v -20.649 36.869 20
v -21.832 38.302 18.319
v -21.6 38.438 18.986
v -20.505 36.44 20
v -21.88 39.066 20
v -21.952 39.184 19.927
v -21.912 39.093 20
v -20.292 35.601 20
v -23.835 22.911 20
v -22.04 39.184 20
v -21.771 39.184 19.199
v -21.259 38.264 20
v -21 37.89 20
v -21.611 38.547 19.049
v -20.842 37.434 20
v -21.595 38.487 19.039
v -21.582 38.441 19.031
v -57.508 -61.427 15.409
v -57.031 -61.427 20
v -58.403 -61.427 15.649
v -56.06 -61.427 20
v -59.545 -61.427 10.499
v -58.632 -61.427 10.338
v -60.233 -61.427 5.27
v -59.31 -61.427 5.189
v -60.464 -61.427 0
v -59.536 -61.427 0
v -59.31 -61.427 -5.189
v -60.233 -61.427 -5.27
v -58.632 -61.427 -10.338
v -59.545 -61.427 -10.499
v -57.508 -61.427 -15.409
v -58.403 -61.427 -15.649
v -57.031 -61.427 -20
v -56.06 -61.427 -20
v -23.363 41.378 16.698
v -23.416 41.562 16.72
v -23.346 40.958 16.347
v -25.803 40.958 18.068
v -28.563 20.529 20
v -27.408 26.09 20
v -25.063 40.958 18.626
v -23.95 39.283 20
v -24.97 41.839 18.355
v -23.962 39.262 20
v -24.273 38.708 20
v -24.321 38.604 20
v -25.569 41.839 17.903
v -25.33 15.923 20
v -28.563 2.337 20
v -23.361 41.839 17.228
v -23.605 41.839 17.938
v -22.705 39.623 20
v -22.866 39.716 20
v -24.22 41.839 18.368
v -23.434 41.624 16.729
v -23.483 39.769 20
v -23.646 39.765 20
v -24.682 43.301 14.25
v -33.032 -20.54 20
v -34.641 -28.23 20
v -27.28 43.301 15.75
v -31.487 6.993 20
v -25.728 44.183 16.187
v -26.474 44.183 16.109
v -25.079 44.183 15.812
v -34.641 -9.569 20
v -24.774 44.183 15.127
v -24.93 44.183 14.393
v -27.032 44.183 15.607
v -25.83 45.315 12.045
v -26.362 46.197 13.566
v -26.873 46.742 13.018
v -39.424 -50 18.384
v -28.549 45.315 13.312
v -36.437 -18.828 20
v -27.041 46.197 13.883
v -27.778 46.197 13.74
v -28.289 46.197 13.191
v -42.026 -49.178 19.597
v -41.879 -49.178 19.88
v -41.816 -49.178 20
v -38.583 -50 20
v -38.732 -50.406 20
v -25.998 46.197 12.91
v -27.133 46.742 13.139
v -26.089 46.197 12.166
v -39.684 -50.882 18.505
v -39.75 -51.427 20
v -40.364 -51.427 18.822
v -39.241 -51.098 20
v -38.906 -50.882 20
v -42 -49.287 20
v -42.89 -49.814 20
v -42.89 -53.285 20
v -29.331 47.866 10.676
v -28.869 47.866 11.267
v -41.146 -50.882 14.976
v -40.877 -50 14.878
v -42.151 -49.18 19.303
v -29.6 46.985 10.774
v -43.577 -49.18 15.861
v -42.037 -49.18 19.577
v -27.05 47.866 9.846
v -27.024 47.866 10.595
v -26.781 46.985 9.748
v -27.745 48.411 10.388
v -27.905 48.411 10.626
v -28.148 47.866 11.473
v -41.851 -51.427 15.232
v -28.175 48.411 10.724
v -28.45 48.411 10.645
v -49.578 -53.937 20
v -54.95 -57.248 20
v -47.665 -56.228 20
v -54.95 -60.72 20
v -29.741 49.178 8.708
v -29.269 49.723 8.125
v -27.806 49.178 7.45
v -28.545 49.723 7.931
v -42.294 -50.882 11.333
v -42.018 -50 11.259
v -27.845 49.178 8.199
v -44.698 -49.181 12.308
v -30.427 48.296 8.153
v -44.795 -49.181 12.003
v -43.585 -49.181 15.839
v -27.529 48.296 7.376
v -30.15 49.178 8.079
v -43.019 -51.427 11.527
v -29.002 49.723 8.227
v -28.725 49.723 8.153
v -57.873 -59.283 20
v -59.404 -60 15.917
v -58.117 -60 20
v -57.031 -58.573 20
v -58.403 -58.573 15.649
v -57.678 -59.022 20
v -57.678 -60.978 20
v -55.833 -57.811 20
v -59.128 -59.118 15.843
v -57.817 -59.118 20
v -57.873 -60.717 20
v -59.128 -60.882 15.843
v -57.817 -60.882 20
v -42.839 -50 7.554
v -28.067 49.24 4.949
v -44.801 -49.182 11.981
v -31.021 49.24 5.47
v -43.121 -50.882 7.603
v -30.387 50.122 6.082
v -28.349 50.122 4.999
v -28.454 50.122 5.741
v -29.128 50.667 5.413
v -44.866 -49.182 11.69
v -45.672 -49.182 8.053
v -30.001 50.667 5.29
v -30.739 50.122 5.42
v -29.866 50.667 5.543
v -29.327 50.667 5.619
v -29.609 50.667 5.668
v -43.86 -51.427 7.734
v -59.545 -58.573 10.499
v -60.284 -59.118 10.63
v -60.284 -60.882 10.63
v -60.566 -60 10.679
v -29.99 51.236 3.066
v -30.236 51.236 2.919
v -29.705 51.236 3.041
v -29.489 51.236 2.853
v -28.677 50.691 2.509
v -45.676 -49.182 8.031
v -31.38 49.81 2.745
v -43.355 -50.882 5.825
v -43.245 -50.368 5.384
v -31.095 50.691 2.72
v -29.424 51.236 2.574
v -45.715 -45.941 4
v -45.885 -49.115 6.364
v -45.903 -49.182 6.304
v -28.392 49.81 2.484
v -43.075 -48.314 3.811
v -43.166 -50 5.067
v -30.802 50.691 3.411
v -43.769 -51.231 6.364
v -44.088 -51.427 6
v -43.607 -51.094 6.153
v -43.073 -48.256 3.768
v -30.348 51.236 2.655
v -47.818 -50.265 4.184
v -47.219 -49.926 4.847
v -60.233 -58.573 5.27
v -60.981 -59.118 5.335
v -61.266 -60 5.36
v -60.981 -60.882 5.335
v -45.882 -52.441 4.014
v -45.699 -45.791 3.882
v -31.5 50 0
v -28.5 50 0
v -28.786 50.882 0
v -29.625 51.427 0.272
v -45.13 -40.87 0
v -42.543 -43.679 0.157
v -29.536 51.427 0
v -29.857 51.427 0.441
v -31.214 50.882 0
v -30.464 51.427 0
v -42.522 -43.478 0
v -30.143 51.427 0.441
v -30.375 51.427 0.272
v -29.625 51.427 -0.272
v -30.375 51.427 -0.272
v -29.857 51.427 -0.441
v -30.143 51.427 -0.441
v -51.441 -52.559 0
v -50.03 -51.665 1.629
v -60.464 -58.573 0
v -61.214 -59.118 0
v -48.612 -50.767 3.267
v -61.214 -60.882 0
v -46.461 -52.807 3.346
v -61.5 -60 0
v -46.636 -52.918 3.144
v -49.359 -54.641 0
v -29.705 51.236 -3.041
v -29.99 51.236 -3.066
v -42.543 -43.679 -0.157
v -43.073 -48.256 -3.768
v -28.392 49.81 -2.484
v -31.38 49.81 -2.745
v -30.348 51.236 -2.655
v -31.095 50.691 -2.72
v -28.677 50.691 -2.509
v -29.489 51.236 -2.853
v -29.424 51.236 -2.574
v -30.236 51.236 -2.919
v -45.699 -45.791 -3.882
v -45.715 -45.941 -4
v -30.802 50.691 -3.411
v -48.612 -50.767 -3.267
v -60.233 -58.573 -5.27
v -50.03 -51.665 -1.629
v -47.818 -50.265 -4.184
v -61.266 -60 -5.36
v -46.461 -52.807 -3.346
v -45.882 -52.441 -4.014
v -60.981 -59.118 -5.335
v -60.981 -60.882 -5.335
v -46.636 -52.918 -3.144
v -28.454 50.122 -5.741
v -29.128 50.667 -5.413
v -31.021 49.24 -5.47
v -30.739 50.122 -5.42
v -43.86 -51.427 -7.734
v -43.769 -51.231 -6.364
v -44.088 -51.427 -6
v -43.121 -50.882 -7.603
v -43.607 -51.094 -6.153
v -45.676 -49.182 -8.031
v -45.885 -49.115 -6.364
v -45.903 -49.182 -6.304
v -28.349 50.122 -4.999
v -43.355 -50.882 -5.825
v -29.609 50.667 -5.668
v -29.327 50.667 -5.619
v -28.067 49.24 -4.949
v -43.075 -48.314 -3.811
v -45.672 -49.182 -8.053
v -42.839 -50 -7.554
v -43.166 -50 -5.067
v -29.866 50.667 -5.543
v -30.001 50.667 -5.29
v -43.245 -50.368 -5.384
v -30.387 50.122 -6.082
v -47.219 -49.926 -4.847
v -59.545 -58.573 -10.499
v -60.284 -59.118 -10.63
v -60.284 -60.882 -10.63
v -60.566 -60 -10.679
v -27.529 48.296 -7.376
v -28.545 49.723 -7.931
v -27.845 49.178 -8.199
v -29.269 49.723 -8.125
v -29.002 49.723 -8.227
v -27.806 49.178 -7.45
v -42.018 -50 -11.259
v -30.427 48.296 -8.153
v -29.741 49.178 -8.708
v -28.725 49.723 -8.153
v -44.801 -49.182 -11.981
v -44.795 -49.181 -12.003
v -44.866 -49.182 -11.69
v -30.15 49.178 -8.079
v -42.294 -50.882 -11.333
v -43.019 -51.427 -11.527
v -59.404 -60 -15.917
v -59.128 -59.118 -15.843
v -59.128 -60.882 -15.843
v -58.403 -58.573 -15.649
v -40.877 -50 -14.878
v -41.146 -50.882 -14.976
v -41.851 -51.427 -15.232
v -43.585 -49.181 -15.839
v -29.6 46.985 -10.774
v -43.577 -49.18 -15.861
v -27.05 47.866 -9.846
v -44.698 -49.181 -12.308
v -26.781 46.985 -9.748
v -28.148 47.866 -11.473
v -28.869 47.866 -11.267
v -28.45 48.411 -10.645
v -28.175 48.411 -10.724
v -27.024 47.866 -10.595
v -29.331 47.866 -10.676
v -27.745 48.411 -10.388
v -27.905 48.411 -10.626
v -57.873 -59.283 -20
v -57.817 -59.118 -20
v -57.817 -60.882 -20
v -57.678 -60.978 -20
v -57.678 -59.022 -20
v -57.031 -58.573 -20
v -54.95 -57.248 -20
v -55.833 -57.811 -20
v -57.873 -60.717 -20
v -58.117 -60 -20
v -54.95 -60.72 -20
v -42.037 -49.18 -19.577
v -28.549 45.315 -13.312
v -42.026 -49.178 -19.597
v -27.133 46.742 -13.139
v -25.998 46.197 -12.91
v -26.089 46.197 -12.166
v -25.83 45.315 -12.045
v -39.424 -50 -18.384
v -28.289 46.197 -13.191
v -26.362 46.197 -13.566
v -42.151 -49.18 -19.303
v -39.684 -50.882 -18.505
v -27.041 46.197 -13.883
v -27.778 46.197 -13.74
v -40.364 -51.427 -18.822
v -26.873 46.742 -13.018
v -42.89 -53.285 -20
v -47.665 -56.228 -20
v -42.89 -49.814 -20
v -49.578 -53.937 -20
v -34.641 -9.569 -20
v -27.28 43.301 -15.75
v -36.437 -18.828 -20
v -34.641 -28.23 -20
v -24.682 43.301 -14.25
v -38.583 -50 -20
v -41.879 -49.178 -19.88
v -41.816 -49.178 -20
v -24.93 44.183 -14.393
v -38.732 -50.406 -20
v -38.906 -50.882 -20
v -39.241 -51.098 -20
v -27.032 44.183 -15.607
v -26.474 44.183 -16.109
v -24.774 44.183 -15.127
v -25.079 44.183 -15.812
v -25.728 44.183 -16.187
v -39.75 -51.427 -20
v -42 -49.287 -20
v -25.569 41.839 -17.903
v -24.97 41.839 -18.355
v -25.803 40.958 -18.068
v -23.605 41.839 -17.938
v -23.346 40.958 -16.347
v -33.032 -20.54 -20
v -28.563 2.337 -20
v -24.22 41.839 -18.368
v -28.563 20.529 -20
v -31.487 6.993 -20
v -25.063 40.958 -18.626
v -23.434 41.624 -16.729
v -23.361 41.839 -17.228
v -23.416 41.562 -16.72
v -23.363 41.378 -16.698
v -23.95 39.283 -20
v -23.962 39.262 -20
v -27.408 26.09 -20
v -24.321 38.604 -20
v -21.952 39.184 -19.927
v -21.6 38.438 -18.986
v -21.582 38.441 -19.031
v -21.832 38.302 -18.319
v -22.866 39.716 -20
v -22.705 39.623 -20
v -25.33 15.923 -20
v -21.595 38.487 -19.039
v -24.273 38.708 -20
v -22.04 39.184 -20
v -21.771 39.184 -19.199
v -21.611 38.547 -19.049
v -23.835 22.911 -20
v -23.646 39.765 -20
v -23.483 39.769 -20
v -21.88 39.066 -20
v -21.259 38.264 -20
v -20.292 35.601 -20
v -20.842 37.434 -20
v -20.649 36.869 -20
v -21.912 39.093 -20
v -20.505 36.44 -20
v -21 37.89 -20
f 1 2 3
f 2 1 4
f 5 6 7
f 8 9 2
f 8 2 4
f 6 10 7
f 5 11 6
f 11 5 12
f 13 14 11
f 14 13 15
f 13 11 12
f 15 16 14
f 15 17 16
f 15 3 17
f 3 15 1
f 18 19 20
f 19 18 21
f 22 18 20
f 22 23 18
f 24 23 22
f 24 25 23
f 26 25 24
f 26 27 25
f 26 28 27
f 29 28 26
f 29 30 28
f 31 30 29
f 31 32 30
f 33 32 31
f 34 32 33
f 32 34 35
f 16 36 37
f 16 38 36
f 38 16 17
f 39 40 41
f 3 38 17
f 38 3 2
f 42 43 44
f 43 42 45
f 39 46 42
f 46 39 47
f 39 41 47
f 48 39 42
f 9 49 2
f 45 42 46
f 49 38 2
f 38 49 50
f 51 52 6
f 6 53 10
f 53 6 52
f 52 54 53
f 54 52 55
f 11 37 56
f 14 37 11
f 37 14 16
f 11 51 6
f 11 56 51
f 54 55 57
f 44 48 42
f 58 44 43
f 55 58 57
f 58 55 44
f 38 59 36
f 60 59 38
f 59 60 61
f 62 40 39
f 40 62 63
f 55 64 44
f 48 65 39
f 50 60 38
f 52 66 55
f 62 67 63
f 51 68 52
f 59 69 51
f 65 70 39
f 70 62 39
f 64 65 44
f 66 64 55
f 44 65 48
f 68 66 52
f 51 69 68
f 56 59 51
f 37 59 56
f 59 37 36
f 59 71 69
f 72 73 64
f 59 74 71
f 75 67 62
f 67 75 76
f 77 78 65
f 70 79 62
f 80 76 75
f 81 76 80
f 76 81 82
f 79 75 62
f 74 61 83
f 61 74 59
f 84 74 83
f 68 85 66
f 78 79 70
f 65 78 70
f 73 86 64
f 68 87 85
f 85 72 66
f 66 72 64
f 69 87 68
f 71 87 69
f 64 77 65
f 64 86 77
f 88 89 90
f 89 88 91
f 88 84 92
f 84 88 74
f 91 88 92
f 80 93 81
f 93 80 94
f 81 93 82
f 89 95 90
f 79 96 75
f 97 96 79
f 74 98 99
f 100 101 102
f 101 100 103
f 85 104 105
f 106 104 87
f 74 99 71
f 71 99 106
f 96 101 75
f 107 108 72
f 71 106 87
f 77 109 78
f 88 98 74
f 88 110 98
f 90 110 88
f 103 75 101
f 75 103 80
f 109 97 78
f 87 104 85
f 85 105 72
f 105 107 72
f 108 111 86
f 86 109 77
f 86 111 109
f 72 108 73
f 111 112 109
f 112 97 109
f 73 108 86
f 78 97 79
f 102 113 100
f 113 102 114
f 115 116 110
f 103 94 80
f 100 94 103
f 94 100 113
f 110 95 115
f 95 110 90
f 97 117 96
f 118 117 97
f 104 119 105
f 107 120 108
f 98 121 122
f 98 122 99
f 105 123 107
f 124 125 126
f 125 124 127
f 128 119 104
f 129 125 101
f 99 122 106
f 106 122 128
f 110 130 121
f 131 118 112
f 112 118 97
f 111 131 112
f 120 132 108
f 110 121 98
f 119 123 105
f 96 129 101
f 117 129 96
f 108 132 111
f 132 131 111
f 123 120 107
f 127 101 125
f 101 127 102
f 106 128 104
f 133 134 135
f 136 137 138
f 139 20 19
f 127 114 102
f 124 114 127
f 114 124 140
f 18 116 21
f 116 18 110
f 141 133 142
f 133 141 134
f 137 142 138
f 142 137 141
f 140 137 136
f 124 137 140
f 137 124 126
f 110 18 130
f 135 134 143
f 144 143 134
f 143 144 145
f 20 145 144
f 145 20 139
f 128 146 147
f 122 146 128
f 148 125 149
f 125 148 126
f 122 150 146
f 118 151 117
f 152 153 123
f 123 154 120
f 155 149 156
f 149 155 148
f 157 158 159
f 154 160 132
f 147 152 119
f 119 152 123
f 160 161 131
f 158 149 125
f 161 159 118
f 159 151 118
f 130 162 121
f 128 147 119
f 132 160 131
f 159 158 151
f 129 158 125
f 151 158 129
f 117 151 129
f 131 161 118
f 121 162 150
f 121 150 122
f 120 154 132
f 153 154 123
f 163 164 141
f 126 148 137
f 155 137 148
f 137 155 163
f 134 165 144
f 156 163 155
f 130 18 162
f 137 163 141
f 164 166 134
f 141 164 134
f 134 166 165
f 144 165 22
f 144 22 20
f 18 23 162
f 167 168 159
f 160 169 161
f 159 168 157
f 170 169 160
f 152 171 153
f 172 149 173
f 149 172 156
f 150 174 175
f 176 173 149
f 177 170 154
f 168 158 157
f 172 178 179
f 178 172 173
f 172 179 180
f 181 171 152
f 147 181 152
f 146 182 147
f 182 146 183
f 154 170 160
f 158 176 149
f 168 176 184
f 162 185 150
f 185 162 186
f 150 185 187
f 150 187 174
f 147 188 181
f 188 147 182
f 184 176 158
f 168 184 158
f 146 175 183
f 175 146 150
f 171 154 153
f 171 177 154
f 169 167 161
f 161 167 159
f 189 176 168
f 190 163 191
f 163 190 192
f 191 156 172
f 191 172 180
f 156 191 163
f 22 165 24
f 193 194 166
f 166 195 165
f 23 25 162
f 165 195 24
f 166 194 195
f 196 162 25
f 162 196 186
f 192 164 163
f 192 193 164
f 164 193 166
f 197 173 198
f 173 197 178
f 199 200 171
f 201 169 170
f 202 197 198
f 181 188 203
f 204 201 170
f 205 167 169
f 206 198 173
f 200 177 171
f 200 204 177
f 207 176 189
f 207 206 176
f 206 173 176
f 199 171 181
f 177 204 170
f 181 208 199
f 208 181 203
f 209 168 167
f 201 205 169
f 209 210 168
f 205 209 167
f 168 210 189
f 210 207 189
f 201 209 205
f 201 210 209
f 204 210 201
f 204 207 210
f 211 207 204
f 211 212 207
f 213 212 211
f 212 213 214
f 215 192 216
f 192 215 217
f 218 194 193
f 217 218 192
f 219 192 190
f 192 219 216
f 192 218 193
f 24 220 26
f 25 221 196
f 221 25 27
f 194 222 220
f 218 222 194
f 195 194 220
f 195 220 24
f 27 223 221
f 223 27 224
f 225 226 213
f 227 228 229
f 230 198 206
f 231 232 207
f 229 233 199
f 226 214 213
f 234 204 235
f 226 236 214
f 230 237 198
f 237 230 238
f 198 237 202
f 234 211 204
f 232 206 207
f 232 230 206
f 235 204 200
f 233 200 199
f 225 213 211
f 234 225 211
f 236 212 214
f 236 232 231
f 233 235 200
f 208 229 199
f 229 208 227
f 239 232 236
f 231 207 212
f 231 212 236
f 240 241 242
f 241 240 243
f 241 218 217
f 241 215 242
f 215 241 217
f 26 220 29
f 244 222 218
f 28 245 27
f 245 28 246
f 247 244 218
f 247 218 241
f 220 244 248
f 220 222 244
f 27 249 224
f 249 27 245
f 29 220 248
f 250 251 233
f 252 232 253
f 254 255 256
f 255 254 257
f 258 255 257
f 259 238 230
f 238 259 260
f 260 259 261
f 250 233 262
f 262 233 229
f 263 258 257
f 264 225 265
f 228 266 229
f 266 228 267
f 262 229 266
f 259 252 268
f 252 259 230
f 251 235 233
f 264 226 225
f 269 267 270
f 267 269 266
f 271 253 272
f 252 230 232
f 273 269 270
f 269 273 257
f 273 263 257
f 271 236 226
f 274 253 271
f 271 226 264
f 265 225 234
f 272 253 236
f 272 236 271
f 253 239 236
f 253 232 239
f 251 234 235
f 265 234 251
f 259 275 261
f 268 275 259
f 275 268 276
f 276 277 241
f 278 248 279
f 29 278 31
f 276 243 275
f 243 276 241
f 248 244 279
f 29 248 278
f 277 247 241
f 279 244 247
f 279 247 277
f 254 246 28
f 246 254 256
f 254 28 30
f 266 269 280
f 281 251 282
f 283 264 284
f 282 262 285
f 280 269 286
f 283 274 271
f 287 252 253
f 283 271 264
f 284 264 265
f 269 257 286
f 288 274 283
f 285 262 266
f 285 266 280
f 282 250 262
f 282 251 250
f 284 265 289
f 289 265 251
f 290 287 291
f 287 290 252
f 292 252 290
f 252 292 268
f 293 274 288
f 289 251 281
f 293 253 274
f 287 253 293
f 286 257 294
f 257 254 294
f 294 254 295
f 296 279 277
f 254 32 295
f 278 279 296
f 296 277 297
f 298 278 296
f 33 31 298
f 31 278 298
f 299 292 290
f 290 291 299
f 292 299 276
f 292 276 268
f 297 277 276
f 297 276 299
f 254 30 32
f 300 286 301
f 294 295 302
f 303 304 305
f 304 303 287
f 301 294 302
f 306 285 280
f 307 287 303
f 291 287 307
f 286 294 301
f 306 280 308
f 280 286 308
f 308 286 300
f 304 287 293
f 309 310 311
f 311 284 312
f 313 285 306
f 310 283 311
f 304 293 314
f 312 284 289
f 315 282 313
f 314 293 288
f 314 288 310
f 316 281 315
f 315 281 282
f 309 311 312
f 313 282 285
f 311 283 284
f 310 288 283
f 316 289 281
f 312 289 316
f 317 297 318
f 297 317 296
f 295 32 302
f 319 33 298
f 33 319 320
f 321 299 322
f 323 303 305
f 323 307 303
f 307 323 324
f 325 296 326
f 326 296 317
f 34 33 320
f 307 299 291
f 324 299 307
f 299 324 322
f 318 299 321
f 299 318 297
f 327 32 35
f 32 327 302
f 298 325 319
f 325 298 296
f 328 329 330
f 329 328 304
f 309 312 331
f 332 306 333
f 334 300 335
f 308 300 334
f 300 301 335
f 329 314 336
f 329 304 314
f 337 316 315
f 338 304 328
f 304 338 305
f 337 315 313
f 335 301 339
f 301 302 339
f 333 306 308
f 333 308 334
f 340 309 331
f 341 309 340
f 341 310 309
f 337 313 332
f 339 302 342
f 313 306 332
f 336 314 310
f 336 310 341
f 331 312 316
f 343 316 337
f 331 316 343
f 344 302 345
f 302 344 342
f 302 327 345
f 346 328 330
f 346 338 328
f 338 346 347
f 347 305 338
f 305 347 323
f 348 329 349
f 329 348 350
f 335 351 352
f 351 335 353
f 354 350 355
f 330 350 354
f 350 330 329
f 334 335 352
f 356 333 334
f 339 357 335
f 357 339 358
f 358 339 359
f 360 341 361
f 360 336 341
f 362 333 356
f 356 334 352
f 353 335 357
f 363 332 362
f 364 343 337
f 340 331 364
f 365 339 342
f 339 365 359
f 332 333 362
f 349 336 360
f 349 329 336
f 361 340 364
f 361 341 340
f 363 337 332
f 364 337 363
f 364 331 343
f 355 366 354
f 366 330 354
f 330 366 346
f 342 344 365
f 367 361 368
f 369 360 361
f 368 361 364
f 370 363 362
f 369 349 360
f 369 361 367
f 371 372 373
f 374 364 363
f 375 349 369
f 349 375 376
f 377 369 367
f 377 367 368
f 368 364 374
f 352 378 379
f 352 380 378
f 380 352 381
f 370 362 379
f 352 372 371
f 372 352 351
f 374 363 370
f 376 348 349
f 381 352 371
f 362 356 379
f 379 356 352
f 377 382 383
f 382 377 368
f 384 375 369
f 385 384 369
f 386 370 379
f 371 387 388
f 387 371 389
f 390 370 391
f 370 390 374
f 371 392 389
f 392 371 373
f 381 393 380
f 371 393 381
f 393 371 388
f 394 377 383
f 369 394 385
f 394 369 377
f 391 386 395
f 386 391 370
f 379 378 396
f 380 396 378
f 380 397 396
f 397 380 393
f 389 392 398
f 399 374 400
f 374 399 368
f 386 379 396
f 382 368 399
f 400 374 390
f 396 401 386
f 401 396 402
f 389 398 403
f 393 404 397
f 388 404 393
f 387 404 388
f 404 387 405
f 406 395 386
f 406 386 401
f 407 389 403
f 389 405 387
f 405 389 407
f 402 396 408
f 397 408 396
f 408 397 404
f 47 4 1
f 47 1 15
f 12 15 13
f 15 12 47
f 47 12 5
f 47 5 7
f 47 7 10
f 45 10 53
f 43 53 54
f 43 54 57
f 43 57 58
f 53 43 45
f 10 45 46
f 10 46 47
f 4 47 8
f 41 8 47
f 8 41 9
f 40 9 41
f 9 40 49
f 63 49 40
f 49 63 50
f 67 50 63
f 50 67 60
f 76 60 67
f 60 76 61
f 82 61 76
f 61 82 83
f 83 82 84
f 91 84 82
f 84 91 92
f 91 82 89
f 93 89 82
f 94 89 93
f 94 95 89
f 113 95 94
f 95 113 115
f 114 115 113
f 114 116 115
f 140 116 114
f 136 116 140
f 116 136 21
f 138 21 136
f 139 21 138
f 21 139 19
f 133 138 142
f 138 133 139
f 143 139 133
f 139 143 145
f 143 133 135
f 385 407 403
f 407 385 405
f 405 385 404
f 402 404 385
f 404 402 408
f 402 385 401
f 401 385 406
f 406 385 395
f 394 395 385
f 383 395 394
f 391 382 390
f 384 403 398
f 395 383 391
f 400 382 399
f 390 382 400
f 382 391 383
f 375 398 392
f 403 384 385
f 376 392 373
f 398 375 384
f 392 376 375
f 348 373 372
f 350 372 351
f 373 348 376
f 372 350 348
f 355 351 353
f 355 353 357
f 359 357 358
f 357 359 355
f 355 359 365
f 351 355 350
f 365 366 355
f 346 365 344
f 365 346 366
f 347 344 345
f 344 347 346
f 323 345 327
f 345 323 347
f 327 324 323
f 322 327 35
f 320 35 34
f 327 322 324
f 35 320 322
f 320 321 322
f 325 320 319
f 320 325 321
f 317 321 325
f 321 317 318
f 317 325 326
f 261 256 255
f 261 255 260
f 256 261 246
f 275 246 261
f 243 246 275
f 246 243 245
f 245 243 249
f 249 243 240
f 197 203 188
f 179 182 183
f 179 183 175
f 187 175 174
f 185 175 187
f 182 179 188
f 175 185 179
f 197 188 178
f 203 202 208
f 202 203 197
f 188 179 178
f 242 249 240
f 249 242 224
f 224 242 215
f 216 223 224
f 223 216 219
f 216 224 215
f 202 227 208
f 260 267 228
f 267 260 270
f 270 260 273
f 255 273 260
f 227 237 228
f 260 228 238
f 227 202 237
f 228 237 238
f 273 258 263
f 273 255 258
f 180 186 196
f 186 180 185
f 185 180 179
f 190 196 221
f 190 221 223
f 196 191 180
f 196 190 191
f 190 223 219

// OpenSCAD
//Length of the shoe horns straight part in mm
height=100; 

//Thickness of the shoe horn in mm
thick=3;

//Diameter of the hole to hang it
holesize=9;

//Radius of the circle for the main curvature at the end of the shoe horn
rad=30;

//Radius multiplier for the middle part of the shoe horn (make it flatter in the middle)
rad_multiplier1=1.5;

//Radius multiplier for the top end (make it even flatter and move it further out)
rad_multiplier2=2;

//How many degree from one face of the curvature to the next (bigger for faster rendering)
angle_step=5;

//Faces for the rounding at the ends of the shoe horn
faces=10;

// preview[view:left, tilt:side]

/* [Hidden] */

/*
Shoe Horn
Version C, November 2014
Written by MC Geisler (mcgenki at gmail dot com)

This is the baby sized version... Customize it to suit a yeti.

Have fun!

License: Attribution-NonCommercial-ShareAlike 4.0 International (CC BY-NC-SA 4.0)
You are free to:
    Share - copy and redistribute the material in any medium or format
    Adapt - remix, transform, and build upon the material
Under the following terms:
    Attribution - You must give appropriate credit, provide a link to the license, and indicate if changes were made. 
    You may do so in any reasonable manner, but not in any way that suggests the licensor endorses you or your use.
    NonCommercial - You may not use the material for commercial purposes.
    ShareAlike - If you remix, transform, or build upon the material, you must distribute your contributions under the same license as the original. 
*/

width=rad*1.4;

module stickballs(rot,low_z,high_z,low_r,high_r,round_low)
{
	rotate([0,0,rot])
		{
			translate([-low_r,0,low_z+(1-cos(rot))*round_low])
				sphere(r=thick/2,center=true,$fn=faces);

			translate([-high_r,0,high_z])
				sphere(r=thick/2,center=true,$fn=faces);
		}
}

//lower part
module stickballslong(rot)
{
	stickballs(rot,-height/2,height/2,rad,rad*rad_multiplier1,height/2);
}

//upper part
module stickballsshort(rot)
{
	stickballs(rot,height/2,height/2+height*.1,rad*rad_multiplier1,rad*rad_multiplier2,0);
}

module shoehorn(length)
{
	angle=45;

	cutsize=max(length,thick,rad,width)*2+2*rad;
	difference()
	{
		union()
		{
			for(i=[-angle:angle_step:angle-angle_step])
			{
				hull()
				{
					stickballslong(i);
					stickballslong(i+angle_step);
				}
				hull()
				{
					stickballsshort(i);
					stickballsshort(i+angle_step);
				}
			}
		}
		translate([0,cutsize/2+width/2,0])
			cube(cutsize+2,center=true);
		translate([0,-(cutsize/2+width/2),0])
			cube(cutsize+2,center=true);
		translate([-rad*rad_multiplier1,0,height/2])
			rotate([0,45,0])
				rotate([0,0,45])
					cube([holesize,holesize,thick*50],center=true);
	}
}

rotate([90,0,0])
	shoehorn(height);
